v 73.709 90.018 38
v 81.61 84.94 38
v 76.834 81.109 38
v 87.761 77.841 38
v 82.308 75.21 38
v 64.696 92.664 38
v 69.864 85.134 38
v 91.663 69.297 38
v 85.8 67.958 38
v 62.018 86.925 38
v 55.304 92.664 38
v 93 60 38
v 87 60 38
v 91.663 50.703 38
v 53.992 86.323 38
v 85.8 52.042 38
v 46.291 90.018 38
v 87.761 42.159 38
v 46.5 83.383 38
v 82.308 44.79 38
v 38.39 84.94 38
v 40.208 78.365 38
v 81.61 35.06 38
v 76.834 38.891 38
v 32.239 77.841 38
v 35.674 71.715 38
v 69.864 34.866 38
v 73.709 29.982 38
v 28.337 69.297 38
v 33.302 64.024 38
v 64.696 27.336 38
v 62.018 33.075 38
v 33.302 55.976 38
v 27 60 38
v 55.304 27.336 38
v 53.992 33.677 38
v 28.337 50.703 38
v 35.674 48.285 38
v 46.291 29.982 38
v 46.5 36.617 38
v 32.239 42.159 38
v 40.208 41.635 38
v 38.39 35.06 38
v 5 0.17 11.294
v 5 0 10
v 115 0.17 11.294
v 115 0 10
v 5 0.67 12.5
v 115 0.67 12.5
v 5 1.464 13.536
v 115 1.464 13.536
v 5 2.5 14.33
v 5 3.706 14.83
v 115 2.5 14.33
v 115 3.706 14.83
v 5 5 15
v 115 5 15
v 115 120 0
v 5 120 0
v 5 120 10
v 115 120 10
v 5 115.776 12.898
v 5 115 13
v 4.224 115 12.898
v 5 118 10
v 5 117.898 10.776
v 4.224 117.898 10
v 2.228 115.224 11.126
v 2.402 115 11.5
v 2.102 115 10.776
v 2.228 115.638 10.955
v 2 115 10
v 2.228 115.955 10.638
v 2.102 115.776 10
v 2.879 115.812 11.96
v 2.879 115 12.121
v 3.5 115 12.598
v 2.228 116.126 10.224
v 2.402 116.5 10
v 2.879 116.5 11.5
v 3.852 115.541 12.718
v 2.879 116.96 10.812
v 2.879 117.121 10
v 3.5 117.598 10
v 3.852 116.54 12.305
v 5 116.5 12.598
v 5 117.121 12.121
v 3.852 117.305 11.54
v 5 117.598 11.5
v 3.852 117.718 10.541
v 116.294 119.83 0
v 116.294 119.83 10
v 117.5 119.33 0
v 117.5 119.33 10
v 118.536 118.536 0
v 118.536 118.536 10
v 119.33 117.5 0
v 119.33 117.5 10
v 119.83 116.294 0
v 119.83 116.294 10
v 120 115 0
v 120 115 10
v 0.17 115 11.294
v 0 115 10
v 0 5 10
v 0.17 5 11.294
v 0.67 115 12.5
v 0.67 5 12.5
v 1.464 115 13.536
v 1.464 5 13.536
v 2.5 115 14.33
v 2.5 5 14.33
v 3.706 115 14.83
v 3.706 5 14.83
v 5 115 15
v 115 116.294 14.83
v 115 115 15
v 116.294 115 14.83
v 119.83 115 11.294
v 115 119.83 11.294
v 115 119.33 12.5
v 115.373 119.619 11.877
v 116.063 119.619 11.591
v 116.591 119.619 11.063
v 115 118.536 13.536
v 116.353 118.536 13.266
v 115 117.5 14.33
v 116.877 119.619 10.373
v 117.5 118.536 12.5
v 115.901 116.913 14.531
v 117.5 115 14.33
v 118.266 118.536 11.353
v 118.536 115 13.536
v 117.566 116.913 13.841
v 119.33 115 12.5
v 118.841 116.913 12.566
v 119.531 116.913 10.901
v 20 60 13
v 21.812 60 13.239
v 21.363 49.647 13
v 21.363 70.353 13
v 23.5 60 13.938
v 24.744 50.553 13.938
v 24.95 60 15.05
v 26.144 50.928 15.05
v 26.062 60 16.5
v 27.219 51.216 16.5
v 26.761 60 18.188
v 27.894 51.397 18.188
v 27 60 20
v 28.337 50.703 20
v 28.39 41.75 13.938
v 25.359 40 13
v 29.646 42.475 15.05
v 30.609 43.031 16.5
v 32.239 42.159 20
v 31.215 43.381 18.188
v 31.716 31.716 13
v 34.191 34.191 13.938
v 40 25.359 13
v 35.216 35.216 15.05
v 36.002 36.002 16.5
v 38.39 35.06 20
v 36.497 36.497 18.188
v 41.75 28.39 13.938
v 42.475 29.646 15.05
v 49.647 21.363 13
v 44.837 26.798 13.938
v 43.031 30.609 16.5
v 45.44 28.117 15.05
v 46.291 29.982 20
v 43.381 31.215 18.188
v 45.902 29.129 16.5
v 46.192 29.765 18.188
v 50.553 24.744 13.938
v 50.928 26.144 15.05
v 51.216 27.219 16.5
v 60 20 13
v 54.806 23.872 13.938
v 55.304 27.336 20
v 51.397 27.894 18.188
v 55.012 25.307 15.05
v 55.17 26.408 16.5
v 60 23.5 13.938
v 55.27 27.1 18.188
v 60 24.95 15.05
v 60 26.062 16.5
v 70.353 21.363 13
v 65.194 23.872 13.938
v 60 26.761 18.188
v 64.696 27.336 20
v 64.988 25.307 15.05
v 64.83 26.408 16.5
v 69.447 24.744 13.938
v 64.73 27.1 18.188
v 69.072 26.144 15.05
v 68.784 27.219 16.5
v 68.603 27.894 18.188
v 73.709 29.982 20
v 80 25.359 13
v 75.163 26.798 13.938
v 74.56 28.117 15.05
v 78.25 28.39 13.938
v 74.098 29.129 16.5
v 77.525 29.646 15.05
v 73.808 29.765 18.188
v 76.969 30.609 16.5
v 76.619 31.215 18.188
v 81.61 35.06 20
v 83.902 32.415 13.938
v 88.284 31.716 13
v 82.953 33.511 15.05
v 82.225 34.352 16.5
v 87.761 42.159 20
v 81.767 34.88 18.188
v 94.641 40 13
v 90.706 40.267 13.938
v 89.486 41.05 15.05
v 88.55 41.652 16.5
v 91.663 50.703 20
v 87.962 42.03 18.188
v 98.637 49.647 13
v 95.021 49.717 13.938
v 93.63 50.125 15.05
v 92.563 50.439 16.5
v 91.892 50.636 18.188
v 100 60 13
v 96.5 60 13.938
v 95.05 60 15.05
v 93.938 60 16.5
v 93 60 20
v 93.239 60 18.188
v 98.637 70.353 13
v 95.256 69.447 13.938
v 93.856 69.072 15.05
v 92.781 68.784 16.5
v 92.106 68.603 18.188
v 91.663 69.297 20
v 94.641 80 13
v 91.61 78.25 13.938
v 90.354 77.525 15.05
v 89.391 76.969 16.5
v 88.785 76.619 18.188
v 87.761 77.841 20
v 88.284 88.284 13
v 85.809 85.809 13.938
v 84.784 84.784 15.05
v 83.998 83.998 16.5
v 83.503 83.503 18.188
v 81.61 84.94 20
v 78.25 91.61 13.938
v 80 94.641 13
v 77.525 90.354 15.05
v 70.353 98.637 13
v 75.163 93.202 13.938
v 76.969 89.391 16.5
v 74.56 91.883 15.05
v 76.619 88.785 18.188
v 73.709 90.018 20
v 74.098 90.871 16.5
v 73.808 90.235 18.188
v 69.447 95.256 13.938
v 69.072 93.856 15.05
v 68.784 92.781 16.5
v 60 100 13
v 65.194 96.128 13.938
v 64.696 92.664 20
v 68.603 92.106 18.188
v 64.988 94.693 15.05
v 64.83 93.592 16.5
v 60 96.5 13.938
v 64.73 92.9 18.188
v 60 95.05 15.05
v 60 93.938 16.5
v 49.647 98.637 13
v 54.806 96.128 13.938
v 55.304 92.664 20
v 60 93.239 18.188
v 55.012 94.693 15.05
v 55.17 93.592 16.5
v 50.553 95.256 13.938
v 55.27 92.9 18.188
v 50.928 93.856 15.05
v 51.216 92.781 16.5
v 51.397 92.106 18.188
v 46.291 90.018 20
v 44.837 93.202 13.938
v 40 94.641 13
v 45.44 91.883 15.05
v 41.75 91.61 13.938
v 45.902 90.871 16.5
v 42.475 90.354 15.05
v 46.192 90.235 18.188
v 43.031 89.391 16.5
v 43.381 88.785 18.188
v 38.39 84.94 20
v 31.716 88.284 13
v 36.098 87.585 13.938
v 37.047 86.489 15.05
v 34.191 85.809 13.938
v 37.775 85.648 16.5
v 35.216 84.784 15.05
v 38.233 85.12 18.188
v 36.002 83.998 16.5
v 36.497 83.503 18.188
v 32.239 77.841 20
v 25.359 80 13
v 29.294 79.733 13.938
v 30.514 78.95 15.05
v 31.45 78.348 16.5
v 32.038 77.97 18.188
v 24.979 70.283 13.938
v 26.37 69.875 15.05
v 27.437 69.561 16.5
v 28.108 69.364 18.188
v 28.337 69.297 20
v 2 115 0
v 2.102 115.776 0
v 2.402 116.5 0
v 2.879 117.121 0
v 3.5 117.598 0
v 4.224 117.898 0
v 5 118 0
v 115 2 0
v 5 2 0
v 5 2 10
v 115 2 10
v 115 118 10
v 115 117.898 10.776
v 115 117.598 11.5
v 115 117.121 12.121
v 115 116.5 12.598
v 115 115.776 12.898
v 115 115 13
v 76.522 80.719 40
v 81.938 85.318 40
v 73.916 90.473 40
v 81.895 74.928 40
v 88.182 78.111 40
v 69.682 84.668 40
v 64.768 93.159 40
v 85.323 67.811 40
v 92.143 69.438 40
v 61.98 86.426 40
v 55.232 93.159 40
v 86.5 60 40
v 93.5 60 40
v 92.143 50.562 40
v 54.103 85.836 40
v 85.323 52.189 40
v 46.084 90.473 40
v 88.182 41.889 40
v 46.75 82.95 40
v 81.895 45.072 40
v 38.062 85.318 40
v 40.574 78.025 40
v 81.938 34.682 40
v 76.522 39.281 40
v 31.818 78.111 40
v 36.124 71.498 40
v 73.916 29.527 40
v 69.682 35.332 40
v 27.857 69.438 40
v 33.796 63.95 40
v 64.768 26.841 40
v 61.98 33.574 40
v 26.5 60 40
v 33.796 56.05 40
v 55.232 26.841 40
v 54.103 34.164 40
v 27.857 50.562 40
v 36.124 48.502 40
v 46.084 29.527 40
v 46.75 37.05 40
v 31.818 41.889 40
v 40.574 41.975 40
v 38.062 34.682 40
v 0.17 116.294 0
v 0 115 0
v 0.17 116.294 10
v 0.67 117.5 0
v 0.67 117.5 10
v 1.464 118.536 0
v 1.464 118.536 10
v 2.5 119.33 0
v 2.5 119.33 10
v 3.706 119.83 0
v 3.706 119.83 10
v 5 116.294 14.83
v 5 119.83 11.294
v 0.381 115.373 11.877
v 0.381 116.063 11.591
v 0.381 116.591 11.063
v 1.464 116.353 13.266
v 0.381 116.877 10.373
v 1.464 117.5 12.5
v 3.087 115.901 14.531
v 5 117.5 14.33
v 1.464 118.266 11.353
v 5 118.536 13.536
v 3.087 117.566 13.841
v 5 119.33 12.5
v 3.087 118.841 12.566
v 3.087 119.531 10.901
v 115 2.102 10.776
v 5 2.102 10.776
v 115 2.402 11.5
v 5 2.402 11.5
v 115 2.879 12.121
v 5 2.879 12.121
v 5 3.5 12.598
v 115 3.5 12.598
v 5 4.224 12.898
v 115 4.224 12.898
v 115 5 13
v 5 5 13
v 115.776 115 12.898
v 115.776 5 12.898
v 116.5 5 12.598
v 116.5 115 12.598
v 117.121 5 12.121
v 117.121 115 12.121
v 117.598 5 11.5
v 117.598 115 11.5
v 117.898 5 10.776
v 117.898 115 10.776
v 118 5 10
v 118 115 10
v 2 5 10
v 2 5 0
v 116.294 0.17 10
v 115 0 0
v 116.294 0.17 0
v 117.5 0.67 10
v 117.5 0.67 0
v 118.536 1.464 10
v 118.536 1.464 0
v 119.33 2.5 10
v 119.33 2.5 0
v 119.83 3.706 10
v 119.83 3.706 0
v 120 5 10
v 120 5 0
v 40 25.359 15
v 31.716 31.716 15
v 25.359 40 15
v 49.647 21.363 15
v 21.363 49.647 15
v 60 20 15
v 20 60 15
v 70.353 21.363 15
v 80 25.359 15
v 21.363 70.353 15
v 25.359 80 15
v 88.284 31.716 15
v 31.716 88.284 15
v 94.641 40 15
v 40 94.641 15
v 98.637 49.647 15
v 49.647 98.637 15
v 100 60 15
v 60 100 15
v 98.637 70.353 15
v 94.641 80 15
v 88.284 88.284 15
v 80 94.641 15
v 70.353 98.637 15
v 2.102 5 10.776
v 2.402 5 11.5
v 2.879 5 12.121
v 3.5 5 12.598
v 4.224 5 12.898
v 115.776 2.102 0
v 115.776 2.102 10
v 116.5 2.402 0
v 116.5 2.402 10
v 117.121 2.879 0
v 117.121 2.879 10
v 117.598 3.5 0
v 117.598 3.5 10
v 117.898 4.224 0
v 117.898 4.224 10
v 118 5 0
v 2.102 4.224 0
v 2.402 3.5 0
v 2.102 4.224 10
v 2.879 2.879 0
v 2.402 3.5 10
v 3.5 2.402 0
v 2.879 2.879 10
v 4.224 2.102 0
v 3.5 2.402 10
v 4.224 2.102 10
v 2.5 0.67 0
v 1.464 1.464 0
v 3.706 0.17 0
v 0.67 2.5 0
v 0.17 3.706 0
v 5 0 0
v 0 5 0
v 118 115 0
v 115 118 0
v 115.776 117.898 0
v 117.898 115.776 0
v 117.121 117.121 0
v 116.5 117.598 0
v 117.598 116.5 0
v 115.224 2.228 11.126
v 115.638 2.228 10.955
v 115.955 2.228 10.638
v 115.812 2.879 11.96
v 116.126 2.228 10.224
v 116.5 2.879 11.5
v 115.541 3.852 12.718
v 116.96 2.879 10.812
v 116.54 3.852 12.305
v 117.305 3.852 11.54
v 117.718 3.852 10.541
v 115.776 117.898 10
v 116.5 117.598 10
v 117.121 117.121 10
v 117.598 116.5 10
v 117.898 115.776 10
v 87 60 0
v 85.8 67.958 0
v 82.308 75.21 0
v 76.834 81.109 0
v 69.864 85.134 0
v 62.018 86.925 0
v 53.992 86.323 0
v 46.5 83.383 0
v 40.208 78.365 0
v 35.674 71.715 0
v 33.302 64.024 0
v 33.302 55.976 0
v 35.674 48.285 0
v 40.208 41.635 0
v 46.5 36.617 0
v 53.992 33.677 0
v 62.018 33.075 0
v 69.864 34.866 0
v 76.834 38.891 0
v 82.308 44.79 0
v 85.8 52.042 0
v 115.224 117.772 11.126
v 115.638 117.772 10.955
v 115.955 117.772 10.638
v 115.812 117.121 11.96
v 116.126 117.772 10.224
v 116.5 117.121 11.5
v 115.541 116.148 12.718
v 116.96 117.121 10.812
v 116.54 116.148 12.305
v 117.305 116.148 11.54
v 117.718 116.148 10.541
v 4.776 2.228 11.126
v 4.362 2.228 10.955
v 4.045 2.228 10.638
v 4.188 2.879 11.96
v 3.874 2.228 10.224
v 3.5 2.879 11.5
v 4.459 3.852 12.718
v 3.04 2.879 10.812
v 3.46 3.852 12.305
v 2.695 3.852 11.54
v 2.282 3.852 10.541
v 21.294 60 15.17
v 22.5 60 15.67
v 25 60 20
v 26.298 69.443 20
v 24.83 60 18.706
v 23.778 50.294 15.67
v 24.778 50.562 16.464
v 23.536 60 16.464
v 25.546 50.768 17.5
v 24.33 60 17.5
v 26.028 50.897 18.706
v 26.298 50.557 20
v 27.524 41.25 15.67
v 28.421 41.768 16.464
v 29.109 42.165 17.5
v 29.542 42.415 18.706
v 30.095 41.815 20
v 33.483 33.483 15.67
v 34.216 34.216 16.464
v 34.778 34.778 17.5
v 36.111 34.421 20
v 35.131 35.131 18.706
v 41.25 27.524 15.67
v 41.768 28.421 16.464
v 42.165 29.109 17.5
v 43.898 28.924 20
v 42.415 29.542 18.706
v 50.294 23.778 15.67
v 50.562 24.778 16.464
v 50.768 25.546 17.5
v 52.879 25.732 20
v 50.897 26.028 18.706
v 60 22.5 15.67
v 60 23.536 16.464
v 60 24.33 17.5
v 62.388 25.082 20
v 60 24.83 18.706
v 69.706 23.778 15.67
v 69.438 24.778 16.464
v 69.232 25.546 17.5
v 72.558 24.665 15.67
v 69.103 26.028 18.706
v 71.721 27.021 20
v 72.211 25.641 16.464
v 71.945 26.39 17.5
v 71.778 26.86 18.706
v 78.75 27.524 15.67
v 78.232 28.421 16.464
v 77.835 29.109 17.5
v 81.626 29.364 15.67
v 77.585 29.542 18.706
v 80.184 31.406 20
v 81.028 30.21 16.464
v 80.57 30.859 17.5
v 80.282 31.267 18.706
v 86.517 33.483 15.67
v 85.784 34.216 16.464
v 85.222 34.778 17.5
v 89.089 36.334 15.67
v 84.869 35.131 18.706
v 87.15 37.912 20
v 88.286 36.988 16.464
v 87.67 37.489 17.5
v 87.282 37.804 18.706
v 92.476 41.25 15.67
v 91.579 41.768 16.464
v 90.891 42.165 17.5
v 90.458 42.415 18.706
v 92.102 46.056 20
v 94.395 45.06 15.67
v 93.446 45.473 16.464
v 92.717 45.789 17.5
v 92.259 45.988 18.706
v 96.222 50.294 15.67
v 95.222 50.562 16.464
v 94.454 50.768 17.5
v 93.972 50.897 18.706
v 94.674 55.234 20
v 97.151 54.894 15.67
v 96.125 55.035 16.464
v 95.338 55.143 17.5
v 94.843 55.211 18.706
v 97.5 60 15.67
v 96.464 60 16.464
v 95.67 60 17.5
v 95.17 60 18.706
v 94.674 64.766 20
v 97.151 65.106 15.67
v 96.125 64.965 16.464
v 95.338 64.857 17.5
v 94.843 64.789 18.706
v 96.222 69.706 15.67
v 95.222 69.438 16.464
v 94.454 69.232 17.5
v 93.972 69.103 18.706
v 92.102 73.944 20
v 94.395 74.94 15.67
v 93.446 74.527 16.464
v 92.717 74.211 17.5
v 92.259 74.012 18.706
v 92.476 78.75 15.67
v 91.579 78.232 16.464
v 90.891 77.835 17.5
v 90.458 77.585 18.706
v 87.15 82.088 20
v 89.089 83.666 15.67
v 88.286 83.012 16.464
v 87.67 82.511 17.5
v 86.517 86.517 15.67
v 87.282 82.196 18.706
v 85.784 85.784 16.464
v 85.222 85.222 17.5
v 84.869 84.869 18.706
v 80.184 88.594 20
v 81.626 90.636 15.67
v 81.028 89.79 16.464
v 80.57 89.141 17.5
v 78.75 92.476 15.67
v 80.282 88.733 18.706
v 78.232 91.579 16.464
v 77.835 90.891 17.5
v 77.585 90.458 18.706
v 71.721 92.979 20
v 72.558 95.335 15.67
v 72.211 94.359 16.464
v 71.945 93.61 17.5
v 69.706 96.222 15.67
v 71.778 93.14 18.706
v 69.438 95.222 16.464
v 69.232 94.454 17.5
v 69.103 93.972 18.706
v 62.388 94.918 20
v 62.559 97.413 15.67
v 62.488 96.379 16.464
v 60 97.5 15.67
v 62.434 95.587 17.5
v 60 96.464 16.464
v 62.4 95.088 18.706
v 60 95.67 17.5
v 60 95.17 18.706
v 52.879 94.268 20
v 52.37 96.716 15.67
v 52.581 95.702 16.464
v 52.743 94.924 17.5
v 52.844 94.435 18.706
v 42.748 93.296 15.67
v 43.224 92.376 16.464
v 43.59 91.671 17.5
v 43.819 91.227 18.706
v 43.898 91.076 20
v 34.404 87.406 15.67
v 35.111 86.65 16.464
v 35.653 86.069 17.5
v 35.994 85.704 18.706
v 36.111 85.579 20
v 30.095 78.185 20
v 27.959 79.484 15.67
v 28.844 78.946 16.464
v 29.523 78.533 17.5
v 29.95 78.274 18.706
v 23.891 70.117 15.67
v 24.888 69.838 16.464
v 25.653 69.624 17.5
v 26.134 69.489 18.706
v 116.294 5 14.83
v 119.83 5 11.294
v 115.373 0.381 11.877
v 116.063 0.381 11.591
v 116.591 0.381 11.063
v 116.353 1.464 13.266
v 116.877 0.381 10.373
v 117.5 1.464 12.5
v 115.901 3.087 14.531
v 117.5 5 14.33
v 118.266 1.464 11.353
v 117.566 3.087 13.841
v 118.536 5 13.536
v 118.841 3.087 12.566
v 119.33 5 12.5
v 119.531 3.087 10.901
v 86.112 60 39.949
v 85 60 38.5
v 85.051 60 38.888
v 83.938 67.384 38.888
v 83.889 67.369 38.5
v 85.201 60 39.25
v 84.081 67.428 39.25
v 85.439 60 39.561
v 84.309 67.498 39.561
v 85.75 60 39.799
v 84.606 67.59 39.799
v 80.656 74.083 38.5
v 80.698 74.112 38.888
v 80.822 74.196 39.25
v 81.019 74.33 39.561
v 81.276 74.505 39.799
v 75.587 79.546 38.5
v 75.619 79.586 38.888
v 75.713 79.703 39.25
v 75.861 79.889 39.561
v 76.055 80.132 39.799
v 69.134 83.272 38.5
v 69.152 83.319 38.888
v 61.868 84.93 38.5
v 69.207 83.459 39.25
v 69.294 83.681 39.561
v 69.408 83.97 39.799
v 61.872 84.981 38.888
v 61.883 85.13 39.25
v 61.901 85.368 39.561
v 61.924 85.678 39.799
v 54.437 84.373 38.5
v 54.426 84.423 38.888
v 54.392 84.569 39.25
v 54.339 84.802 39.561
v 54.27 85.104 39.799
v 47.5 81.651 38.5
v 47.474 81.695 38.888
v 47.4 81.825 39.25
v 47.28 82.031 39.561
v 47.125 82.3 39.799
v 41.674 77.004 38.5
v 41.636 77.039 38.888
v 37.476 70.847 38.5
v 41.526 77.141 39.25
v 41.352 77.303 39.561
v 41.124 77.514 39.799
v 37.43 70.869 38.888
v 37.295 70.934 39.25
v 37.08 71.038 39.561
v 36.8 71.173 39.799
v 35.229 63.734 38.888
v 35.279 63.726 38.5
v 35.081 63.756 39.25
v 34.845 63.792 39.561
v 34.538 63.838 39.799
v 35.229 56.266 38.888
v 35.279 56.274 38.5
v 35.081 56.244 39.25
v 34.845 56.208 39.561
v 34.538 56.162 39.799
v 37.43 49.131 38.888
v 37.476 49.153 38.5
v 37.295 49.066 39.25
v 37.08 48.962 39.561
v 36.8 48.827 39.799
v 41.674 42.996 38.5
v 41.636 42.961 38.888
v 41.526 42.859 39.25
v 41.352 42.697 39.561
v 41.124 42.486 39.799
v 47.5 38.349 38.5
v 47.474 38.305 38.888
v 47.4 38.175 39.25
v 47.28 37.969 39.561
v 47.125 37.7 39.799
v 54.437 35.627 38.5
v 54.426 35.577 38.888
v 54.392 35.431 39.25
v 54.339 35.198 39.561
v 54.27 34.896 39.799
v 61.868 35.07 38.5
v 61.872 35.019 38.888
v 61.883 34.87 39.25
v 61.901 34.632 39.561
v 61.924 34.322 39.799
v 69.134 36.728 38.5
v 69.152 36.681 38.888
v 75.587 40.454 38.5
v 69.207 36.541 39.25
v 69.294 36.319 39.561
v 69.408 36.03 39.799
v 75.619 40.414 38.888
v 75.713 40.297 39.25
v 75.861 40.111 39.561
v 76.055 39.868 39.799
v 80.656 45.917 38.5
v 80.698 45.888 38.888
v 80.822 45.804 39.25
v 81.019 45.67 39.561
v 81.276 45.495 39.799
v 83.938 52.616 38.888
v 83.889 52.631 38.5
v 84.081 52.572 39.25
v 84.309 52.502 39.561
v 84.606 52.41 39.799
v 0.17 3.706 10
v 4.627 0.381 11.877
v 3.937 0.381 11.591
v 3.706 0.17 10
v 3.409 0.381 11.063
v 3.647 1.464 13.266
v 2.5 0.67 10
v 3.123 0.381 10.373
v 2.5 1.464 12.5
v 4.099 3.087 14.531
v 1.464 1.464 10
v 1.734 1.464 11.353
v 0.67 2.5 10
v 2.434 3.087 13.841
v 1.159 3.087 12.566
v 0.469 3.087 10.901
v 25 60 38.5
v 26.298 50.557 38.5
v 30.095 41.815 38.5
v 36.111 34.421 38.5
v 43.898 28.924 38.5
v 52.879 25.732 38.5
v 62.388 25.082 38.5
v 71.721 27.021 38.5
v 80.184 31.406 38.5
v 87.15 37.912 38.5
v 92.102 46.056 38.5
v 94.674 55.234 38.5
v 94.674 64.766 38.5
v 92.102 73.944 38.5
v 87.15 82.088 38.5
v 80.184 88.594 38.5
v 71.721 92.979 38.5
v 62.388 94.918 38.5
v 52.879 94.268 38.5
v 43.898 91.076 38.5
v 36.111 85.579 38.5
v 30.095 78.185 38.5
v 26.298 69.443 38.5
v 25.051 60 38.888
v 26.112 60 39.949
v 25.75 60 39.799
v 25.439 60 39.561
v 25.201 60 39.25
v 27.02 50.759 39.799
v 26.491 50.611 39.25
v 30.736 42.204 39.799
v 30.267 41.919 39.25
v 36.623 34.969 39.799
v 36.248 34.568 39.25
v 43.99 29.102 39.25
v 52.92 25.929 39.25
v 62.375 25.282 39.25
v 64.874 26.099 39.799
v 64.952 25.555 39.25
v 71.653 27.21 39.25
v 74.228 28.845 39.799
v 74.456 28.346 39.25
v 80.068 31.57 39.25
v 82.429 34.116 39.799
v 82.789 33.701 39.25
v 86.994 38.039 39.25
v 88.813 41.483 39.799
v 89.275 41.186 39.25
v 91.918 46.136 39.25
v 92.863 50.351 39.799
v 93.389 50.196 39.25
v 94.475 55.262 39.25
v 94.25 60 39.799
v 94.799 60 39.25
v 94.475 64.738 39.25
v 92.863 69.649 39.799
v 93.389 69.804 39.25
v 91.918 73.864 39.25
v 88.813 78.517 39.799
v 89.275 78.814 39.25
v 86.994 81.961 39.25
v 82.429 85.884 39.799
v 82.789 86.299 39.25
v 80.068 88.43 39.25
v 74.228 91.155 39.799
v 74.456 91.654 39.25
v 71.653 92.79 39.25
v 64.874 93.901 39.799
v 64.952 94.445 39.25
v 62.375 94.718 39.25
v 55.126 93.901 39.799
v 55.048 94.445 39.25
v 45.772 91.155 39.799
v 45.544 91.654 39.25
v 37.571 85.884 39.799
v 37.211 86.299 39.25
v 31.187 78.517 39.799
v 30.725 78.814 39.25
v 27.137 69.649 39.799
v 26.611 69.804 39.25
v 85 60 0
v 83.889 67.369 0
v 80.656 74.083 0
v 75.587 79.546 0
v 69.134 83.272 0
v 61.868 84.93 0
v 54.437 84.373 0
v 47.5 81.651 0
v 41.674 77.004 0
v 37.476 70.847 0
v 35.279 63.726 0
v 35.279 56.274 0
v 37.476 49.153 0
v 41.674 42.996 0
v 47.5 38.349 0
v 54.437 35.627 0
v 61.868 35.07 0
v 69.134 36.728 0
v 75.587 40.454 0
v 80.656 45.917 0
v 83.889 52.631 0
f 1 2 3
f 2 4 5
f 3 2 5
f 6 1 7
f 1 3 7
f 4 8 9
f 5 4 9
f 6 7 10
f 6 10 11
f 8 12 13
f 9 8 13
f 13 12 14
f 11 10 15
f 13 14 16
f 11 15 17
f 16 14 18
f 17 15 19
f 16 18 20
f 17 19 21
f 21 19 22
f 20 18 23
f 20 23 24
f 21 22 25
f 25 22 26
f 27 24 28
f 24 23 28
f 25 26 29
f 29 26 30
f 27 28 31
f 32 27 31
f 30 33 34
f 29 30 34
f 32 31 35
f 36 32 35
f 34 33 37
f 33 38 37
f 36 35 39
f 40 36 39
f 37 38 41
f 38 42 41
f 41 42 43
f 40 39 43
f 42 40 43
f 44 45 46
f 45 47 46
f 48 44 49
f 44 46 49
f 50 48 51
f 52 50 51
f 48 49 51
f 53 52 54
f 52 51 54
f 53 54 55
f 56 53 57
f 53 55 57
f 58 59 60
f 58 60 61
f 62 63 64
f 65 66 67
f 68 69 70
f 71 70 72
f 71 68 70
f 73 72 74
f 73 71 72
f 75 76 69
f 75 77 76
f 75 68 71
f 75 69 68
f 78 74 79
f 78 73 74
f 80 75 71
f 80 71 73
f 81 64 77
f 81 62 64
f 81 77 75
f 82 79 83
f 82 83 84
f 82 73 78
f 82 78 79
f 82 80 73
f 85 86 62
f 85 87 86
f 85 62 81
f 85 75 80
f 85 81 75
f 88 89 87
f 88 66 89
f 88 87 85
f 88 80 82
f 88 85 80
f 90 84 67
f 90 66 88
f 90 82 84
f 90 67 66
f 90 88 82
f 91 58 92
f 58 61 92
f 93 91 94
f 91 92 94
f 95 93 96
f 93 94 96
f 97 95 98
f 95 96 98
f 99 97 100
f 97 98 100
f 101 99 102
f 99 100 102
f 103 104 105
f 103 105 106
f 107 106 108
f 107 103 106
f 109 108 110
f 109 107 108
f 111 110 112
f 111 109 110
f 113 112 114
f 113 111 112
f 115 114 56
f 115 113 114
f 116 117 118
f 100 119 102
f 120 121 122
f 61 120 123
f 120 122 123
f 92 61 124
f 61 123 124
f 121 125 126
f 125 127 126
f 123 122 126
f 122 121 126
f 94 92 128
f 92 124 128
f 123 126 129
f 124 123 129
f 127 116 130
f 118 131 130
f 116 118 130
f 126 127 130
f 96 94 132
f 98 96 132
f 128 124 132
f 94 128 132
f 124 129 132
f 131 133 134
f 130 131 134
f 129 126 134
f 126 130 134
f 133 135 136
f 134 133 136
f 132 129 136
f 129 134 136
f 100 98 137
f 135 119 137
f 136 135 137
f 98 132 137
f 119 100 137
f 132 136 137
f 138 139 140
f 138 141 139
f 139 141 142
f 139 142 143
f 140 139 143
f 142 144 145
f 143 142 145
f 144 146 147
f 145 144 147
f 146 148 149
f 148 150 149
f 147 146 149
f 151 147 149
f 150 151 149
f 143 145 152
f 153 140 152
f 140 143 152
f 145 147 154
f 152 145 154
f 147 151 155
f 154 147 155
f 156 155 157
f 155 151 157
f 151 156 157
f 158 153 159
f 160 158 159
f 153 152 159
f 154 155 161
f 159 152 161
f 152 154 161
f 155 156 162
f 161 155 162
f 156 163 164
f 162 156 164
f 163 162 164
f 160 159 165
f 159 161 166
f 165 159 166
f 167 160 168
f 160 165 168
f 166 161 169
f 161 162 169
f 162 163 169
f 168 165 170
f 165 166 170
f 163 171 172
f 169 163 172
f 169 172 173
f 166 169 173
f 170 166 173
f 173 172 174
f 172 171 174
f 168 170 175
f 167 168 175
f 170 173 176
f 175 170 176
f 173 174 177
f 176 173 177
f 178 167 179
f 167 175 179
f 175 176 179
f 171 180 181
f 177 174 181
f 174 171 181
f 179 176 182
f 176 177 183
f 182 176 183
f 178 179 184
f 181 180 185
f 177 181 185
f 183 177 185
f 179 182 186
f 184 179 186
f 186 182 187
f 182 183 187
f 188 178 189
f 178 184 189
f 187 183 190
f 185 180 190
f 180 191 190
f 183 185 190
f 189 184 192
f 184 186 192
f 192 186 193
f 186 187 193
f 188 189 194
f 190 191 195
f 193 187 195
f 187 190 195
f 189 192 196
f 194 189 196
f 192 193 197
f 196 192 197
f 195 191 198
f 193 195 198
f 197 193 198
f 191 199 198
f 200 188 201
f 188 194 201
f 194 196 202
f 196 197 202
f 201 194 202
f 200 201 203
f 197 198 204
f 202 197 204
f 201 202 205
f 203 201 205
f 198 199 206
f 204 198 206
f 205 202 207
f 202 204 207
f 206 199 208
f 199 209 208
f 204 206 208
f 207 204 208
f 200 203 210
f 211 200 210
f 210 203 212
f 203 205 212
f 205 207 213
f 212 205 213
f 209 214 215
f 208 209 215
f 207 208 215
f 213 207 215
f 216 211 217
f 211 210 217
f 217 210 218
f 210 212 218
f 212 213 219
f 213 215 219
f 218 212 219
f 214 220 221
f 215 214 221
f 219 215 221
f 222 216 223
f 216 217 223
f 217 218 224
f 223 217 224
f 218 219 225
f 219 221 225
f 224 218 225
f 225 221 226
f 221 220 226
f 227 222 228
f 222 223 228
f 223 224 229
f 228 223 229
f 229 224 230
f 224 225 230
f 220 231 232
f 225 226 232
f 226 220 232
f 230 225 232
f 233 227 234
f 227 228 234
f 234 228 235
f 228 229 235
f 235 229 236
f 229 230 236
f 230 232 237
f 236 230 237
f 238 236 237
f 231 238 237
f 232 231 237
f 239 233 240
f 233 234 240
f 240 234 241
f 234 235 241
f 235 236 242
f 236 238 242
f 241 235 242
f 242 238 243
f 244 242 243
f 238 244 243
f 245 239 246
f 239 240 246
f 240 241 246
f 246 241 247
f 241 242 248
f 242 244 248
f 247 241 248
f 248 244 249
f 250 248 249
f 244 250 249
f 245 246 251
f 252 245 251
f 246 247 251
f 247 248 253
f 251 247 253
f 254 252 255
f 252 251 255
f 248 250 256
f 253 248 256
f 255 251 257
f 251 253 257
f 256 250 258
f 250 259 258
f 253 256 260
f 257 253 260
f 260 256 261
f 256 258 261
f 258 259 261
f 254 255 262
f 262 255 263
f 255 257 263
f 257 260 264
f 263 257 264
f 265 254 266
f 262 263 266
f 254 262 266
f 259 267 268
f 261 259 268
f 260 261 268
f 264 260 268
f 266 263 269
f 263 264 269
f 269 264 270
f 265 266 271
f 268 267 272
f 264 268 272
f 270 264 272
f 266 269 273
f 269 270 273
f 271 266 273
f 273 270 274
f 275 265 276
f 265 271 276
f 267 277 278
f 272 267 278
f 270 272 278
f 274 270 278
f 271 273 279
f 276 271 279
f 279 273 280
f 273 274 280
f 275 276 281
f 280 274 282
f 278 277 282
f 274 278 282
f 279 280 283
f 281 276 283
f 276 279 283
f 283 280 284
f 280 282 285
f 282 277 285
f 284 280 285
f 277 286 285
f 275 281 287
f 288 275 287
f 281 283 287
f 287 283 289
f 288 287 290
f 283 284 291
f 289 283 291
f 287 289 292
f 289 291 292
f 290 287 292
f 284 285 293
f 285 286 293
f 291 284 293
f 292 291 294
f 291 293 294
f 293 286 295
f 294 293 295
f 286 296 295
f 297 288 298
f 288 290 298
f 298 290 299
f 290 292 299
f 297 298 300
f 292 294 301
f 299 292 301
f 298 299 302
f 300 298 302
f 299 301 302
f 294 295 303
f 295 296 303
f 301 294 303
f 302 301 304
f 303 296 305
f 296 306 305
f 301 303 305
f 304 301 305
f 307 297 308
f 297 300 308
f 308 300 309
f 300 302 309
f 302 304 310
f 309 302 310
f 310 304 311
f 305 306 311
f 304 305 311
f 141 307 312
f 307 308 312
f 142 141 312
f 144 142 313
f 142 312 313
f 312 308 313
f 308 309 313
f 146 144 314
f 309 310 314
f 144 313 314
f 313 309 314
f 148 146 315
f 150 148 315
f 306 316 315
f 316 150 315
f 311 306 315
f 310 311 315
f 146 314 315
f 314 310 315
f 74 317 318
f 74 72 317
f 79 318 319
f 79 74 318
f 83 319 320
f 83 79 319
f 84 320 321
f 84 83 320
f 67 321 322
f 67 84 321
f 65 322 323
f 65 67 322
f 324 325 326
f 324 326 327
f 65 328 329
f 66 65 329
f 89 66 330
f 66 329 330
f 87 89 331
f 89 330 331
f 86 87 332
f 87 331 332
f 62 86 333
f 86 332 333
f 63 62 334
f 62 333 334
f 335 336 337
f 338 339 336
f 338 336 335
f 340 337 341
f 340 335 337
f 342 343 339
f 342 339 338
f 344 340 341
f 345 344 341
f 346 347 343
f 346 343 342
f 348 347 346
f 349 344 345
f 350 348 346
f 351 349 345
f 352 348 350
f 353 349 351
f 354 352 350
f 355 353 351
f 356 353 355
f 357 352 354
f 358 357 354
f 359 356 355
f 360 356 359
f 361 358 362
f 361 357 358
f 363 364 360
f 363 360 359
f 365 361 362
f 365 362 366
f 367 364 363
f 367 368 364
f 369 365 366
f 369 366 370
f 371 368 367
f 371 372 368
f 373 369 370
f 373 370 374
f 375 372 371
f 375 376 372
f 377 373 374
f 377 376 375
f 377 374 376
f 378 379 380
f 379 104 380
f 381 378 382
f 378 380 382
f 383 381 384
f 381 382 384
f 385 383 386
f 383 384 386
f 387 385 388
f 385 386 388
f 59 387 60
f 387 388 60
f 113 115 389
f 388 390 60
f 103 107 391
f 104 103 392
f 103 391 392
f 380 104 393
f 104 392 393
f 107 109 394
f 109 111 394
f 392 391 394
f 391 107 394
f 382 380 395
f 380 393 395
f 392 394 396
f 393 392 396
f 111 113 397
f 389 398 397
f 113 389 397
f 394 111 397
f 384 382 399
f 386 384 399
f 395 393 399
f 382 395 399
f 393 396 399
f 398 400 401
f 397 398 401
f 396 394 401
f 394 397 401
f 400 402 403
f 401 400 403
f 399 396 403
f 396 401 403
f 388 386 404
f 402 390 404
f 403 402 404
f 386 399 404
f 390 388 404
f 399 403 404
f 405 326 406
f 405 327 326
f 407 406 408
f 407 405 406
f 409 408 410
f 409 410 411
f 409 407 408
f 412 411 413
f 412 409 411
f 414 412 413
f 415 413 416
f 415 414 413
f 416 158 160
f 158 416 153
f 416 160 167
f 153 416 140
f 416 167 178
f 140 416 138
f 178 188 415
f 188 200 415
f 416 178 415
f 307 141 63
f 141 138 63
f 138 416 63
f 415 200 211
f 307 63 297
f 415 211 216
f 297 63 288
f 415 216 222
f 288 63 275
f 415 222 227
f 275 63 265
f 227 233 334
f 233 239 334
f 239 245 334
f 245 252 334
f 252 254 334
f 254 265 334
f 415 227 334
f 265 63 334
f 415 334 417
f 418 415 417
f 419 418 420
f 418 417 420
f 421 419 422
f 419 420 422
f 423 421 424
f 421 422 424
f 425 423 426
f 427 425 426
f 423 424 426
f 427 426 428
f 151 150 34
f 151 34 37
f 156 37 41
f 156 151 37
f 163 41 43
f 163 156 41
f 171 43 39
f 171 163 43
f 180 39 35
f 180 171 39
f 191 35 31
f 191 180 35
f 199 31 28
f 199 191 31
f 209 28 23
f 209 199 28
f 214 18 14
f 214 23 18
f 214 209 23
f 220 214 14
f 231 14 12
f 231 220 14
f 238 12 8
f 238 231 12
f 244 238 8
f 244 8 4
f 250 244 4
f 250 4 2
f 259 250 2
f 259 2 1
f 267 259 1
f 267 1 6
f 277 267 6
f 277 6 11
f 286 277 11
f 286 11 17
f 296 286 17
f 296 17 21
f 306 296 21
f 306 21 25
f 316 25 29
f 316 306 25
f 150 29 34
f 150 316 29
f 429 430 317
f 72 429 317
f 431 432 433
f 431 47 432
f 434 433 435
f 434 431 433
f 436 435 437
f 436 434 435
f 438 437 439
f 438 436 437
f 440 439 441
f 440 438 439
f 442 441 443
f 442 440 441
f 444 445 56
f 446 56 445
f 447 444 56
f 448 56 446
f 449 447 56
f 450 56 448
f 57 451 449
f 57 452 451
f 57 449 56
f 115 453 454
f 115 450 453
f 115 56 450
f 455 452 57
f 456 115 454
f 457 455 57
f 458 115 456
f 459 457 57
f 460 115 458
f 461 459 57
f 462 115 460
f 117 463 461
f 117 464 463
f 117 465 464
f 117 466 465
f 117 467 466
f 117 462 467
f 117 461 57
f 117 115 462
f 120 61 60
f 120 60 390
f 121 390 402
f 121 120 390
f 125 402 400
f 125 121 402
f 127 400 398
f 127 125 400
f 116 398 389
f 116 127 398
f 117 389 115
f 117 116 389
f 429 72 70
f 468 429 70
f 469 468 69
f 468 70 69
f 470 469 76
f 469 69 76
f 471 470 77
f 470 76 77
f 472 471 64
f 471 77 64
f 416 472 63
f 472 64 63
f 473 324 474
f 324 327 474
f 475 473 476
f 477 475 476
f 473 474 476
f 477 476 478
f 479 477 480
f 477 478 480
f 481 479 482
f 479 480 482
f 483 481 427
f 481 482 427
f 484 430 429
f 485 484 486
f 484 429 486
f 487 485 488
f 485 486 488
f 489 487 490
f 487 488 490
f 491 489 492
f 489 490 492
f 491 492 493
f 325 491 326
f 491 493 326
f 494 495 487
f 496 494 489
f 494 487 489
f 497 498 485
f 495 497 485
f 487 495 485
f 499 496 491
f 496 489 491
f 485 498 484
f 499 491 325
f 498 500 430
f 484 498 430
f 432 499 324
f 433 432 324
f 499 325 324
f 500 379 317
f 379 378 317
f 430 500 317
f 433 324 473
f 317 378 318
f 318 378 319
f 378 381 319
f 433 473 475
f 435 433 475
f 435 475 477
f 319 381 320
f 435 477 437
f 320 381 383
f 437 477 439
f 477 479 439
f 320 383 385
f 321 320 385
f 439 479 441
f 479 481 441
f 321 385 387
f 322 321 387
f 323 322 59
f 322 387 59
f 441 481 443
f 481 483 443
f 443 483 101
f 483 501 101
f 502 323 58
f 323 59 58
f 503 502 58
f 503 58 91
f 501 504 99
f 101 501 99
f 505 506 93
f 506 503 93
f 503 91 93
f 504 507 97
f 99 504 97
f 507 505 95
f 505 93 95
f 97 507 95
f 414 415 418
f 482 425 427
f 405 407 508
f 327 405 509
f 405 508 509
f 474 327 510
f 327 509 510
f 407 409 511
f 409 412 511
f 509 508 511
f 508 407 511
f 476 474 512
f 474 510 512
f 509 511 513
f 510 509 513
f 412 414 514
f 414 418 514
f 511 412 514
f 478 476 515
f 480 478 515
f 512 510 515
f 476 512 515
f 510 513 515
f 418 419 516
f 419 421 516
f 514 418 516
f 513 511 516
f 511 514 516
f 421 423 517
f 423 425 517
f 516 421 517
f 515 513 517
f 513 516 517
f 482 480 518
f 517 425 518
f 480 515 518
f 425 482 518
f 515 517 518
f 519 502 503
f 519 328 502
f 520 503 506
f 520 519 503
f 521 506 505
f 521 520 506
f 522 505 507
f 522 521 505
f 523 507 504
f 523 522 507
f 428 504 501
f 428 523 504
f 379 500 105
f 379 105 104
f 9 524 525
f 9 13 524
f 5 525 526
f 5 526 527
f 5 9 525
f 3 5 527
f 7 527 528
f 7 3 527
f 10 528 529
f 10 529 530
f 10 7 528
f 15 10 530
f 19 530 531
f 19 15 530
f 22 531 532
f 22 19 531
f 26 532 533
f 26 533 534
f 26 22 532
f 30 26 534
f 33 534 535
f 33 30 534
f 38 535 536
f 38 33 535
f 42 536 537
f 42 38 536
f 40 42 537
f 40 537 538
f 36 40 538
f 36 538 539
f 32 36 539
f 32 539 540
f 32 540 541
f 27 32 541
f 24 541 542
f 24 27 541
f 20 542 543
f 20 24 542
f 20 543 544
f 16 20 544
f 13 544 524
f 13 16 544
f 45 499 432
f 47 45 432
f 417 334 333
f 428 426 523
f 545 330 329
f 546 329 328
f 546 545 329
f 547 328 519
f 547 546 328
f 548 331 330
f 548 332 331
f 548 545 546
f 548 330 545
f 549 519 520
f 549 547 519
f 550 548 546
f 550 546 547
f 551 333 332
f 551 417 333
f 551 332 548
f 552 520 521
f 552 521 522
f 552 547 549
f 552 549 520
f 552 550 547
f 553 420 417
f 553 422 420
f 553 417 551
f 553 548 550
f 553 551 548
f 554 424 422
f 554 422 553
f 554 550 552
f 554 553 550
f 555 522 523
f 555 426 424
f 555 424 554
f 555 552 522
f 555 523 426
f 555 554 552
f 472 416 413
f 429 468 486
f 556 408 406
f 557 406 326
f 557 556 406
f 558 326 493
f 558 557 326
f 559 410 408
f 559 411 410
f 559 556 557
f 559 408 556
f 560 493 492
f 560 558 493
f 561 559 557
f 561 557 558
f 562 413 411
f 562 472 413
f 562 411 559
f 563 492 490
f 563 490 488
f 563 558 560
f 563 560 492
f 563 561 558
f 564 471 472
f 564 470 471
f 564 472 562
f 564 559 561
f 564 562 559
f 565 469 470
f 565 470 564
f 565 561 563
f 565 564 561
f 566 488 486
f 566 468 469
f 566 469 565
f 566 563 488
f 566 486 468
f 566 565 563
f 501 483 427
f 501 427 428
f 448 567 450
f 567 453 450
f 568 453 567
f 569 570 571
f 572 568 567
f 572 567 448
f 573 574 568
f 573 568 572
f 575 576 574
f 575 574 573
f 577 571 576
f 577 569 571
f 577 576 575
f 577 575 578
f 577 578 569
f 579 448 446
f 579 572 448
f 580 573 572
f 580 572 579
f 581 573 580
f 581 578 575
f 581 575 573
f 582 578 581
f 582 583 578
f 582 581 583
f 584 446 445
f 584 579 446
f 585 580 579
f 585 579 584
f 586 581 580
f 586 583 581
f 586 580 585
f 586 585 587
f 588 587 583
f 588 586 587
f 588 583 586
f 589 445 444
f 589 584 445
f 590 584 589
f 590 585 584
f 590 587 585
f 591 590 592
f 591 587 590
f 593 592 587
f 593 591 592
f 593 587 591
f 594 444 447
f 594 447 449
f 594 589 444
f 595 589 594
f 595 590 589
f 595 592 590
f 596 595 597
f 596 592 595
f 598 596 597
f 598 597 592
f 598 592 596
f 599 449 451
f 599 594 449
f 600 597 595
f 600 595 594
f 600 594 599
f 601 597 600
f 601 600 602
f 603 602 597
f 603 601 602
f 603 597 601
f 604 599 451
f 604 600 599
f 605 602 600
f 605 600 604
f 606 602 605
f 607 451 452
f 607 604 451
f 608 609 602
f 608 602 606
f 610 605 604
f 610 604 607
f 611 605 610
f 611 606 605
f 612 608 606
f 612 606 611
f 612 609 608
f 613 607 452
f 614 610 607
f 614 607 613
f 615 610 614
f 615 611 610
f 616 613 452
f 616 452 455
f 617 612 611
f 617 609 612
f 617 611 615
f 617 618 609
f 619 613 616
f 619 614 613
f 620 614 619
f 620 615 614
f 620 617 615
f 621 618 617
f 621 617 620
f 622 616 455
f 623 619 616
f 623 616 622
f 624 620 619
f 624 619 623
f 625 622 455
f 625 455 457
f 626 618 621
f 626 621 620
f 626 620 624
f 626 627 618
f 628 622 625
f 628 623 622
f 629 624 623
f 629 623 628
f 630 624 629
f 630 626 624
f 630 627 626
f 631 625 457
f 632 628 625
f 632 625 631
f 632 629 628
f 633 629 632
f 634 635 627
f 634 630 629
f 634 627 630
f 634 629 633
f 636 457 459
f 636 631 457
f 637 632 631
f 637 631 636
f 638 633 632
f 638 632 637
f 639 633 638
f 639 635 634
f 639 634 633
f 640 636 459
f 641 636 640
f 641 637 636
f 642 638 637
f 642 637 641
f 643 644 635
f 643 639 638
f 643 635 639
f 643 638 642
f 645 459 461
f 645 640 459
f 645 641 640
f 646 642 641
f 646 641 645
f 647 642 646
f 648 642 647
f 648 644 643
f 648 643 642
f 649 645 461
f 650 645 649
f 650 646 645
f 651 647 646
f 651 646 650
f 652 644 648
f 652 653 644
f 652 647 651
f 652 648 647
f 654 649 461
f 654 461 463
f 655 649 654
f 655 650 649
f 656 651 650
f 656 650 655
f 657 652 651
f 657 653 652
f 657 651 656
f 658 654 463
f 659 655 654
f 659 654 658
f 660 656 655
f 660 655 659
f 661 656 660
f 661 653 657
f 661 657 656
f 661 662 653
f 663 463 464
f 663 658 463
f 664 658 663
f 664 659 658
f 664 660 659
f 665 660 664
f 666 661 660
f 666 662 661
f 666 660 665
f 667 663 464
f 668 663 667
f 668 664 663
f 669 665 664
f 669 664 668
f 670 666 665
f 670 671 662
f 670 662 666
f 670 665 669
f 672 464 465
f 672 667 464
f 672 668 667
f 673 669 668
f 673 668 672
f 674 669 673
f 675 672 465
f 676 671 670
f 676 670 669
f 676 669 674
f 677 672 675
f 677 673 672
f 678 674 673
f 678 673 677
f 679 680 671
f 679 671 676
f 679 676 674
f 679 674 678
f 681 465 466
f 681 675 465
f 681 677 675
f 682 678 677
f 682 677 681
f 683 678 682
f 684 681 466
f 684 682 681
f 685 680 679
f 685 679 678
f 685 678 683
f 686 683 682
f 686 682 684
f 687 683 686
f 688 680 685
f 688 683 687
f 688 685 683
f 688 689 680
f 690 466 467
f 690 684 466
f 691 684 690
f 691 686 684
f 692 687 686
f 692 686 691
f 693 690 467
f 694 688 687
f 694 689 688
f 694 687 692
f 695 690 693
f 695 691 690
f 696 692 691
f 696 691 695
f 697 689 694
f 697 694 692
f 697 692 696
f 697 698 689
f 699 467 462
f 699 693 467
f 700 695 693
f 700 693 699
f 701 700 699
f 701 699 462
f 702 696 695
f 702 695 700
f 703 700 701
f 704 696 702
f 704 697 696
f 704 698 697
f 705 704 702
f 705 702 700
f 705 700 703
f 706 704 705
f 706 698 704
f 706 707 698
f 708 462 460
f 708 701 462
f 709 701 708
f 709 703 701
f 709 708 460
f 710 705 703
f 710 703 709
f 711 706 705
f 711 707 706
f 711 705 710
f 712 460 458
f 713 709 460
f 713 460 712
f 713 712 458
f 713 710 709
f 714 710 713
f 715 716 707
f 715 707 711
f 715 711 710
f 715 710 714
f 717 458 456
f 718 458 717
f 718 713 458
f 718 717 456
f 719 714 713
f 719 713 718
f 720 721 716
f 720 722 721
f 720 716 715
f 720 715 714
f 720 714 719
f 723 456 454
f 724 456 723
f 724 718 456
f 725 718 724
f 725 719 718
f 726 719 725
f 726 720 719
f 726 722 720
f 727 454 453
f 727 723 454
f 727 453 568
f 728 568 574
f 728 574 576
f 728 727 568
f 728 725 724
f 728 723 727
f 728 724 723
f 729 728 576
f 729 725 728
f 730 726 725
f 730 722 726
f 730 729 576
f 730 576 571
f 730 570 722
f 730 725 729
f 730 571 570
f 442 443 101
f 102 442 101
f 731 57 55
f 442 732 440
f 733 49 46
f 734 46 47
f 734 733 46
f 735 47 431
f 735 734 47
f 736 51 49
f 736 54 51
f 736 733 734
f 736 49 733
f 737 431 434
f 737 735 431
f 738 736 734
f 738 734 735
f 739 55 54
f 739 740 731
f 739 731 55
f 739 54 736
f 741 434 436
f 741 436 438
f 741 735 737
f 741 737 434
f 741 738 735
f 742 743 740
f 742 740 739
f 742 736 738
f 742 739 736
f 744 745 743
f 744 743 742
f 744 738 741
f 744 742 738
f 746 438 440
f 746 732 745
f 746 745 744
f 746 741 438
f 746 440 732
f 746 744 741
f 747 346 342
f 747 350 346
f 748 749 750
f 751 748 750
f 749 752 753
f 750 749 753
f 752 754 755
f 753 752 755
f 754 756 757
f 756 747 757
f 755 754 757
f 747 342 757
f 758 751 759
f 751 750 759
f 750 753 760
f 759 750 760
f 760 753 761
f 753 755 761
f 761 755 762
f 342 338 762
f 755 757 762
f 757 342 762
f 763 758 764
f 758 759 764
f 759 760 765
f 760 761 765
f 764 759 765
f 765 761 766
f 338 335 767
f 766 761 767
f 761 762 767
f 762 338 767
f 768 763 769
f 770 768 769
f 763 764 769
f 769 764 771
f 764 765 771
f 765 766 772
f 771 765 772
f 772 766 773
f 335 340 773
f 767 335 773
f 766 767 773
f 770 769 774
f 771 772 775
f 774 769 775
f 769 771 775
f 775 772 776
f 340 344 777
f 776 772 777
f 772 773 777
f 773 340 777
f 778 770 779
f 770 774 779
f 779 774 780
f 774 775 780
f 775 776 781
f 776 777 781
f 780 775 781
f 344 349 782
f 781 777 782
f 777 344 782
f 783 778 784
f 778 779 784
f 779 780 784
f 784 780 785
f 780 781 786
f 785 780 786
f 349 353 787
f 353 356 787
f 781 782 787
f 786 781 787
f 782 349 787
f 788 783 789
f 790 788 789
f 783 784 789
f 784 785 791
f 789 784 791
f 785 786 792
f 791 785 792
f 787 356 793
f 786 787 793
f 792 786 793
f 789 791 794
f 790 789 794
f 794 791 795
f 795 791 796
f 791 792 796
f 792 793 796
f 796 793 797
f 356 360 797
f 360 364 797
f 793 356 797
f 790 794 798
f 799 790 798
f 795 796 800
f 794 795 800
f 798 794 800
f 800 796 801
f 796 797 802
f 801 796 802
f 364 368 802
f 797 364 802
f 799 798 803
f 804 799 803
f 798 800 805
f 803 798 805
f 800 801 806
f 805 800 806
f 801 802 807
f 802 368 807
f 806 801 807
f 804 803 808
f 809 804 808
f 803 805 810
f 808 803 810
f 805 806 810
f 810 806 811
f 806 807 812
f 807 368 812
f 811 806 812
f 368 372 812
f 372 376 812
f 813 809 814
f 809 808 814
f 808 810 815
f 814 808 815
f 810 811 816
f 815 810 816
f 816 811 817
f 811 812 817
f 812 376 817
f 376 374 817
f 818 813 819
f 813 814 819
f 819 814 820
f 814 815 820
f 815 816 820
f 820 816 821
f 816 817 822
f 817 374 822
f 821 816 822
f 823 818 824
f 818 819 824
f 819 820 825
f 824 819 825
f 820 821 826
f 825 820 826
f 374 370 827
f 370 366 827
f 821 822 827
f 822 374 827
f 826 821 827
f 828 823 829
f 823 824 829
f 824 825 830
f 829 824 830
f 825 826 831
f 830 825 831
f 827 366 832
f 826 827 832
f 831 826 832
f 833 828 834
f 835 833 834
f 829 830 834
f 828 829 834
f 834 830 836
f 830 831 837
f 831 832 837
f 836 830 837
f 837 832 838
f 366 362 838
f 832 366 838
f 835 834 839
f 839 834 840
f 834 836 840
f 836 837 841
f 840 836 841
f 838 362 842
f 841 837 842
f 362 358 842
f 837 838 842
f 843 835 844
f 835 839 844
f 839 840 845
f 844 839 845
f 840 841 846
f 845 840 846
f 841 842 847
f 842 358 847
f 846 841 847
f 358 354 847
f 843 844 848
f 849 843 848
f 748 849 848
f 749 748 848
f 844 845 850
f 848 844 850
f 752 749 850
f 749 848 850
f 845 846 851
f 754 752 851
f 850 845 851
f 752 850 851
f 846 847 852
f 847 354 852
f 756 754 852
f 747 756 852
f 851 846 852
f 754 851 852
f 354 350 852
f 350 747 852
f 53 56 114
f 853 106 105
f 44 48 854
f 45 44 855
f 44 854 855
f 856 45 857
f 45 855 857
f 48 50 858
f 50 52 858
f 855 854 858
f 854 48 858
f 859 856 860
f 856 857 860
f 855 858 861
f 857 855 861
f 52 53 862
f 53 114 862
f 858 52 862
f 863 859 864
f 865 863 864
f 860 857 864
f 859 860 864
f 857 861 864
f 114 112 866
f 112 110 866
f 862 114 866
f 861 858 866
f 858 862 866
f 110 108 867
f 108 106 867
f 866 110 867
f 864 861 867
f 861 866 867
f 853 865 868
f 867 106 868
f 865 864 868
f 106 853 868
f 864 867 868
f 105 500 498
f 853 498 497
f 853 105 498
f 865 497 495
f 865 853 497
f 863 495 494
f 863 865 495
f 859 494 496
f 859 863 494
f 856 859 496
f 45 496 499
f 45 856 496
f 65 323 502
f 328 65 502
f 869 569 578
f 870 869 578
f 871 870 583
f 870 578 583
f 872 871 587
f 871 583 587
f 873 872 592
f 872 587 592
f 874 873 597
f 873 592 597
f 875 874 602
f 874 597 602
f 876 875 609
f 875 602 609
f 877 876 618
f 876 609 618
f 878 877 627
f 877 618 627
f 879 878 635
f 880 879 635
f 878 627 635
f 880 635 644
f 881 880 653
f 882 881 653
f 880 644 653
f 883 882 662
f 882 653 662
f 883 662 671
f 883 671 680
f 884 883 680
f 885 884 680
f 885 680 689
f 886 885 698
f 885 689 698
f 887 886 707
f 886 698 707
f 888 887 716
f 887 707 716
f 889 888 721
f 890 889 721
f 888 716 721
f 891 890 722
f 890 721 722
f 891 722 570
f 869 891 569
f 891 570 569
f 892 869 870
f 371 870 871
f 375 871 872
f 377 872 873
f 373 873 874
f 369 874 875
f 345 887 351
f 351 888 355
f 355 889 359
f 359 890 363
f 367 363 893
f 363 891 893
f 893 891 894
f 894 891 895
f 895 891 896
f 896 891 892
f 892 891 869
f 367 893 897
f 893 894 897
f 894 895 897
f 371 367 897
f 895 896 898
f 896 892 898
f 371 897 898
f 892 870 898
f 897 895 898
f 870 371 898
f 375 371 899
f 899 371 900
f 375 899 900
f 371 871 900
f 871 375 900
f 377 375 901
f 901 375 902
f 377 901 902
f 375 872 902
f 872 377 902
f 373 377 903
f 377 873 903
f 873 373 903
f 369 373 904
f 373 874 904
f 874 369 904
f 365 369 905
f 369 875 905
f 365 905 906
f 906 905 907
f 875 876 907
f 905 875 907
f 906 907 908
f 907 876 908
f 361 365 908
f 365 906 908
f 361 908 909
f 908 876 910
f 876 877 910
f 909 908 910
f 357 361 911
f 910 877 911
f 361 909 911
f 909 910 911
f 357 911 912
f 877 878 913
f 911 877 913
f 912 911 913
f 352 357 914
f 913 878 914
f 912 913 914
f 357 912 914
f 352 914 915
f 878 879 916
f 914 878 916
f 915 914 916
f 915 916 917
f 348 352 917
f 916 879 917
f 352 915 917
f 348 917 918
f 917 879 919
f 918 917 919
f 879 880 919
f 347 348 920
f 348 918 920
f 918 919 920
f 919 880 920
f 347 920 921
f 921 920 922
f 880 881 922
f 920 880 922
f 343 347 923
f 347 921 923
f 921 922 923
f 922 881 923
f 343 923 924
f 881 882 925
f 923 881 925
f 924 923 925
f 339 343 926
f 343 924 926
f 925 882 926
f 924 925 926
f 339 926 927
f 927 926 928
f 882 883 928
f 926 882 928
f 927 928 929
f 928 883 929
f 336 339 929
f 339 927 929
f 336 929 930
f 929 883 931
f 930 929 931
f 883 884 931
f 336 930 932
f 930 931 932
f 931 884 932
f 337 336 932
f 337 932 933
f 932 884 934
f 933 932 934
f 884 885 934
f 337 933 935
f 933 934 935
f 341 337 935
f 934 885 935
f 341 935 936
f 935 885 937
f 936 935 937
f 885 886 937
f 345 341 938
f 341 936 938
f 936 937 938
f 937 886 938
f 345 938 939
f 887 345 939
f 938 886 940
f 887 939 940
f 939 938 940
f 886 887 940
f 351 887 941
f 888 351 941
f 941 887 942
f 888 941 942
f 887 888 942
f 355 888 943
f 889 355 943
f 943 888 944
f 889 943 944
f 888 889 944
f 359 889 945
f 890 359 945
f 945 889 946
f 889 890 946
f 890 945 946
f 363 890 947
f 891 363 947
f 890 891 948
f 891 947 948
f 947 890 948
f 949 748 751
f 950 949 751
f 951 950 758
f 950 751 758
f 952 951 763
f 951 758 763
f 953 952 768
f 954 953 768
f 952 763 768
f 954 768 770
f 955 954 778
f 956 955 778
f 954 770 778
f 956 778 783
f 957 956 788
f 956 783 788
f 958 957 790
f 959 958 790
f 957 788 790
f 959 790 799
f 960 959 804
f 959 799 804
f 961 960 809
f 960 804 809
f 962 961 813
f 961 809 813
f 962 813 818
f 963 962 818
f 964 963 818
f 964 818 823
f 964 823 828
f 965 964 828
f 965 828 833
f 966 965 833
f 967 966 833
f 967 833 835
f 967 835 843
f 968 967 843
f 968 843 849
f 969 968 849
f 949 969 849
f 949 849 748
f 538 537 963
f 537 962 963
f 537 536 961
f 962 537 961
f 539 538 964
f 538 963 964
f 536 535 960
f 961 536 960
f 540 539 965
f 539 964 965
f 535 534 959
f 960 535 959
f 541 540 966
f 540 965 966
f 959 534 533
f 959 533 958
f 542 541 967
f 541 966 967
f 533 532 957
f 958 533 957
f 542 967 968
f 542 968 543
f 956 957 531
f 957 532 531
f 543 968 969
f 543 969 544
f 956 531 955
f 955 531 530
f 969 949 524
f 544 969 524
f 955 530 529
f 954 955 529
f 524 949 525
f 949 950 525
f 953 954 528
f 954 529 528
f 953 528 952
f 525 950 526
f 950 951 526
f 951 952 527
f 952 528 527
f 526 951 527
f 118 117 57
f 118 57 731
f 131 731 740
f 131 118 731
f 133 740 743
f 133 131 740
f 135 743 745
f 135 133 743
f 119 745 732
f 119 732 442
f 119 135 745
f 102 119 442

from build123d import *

# Parameters (mm, degrees)
SKETCH2_W           = 120
SKETCH2_H           = 120
BOSS_EXTRUDE1_DEPTH = 15
SKETCH3_R           = 35
BOSS_EXTRUDE2_DEPTH = 25
SKETCH4_R           = 25
CUT_EXTRUDE1_DEPTH  = 175.355957742
FILLET1_R           = 5
FILLET2_R           = 1.5
SHELL1_T            = -2


with BuildPart() as part:
    # Sketch2 → Boss-Extrude1 (new body)
    with BuildSketch(Plane.XY):
        with Locations((60, 60)):
            Rectangle(SKETCH2_W, SKETCH2_H)
    extrude(amount=BOSS_EXTRUDE1_DEPTH)

    # Sketch3 → Boss-Extrude2 (add)
    with BuildSketch(Plane.XY.offset(15)):
        with Locations(Location((60, 60, 0), (0, 0, 180))):
            Circle(SKETCH3_R)
    extrude(amount=BOSS_EXTRUDE2_DEPTH)

    # Sketch4 → Cut-Extrude1 (cut, through all)
    with BuildSketch(Plane.XY.offset(40)):
        with Locations((60, 60)):
            Circle(SKETCH4_R)
    extrude(amount=-CUT_EXTRUDE1_DEPTH, mode=Mode.SUBTRACT)

    # Fillet1
    fillet1_edges = [part.edges().sort_by_distance(p)[0] for p in [
        (120, 60, 15),
        (60, 120, 15),
        (95, 60, 15),
        (0, 60, 15),
        (60, 0, 15),
        (0, 120, 7.5),
        (120, 120, 7.5),
        (120, 0, 7.5),
        (0, 0, 7.5),
    ]]
    fillet(fillet1_edges, radius=FILLET1_R)

    # Fillet2
    fillet2_edges = [part.edges().sort_by_distance(p)[0] for p in [
        (95, 60, 40),
        (35, 60, 40),
    ]]
    fillet(fillet2_edges, radius=FILLET2_R)

    # Shell1
    shell1_openings = [part.faces().sort_by_distance(p)[0] for p in [
        (60, 1.697056275, 0),
    ]]
    offset(amount=SHELL1_T, openings=shell1_openings, kind=Kind.INTERSECTION)


solid = part.part
